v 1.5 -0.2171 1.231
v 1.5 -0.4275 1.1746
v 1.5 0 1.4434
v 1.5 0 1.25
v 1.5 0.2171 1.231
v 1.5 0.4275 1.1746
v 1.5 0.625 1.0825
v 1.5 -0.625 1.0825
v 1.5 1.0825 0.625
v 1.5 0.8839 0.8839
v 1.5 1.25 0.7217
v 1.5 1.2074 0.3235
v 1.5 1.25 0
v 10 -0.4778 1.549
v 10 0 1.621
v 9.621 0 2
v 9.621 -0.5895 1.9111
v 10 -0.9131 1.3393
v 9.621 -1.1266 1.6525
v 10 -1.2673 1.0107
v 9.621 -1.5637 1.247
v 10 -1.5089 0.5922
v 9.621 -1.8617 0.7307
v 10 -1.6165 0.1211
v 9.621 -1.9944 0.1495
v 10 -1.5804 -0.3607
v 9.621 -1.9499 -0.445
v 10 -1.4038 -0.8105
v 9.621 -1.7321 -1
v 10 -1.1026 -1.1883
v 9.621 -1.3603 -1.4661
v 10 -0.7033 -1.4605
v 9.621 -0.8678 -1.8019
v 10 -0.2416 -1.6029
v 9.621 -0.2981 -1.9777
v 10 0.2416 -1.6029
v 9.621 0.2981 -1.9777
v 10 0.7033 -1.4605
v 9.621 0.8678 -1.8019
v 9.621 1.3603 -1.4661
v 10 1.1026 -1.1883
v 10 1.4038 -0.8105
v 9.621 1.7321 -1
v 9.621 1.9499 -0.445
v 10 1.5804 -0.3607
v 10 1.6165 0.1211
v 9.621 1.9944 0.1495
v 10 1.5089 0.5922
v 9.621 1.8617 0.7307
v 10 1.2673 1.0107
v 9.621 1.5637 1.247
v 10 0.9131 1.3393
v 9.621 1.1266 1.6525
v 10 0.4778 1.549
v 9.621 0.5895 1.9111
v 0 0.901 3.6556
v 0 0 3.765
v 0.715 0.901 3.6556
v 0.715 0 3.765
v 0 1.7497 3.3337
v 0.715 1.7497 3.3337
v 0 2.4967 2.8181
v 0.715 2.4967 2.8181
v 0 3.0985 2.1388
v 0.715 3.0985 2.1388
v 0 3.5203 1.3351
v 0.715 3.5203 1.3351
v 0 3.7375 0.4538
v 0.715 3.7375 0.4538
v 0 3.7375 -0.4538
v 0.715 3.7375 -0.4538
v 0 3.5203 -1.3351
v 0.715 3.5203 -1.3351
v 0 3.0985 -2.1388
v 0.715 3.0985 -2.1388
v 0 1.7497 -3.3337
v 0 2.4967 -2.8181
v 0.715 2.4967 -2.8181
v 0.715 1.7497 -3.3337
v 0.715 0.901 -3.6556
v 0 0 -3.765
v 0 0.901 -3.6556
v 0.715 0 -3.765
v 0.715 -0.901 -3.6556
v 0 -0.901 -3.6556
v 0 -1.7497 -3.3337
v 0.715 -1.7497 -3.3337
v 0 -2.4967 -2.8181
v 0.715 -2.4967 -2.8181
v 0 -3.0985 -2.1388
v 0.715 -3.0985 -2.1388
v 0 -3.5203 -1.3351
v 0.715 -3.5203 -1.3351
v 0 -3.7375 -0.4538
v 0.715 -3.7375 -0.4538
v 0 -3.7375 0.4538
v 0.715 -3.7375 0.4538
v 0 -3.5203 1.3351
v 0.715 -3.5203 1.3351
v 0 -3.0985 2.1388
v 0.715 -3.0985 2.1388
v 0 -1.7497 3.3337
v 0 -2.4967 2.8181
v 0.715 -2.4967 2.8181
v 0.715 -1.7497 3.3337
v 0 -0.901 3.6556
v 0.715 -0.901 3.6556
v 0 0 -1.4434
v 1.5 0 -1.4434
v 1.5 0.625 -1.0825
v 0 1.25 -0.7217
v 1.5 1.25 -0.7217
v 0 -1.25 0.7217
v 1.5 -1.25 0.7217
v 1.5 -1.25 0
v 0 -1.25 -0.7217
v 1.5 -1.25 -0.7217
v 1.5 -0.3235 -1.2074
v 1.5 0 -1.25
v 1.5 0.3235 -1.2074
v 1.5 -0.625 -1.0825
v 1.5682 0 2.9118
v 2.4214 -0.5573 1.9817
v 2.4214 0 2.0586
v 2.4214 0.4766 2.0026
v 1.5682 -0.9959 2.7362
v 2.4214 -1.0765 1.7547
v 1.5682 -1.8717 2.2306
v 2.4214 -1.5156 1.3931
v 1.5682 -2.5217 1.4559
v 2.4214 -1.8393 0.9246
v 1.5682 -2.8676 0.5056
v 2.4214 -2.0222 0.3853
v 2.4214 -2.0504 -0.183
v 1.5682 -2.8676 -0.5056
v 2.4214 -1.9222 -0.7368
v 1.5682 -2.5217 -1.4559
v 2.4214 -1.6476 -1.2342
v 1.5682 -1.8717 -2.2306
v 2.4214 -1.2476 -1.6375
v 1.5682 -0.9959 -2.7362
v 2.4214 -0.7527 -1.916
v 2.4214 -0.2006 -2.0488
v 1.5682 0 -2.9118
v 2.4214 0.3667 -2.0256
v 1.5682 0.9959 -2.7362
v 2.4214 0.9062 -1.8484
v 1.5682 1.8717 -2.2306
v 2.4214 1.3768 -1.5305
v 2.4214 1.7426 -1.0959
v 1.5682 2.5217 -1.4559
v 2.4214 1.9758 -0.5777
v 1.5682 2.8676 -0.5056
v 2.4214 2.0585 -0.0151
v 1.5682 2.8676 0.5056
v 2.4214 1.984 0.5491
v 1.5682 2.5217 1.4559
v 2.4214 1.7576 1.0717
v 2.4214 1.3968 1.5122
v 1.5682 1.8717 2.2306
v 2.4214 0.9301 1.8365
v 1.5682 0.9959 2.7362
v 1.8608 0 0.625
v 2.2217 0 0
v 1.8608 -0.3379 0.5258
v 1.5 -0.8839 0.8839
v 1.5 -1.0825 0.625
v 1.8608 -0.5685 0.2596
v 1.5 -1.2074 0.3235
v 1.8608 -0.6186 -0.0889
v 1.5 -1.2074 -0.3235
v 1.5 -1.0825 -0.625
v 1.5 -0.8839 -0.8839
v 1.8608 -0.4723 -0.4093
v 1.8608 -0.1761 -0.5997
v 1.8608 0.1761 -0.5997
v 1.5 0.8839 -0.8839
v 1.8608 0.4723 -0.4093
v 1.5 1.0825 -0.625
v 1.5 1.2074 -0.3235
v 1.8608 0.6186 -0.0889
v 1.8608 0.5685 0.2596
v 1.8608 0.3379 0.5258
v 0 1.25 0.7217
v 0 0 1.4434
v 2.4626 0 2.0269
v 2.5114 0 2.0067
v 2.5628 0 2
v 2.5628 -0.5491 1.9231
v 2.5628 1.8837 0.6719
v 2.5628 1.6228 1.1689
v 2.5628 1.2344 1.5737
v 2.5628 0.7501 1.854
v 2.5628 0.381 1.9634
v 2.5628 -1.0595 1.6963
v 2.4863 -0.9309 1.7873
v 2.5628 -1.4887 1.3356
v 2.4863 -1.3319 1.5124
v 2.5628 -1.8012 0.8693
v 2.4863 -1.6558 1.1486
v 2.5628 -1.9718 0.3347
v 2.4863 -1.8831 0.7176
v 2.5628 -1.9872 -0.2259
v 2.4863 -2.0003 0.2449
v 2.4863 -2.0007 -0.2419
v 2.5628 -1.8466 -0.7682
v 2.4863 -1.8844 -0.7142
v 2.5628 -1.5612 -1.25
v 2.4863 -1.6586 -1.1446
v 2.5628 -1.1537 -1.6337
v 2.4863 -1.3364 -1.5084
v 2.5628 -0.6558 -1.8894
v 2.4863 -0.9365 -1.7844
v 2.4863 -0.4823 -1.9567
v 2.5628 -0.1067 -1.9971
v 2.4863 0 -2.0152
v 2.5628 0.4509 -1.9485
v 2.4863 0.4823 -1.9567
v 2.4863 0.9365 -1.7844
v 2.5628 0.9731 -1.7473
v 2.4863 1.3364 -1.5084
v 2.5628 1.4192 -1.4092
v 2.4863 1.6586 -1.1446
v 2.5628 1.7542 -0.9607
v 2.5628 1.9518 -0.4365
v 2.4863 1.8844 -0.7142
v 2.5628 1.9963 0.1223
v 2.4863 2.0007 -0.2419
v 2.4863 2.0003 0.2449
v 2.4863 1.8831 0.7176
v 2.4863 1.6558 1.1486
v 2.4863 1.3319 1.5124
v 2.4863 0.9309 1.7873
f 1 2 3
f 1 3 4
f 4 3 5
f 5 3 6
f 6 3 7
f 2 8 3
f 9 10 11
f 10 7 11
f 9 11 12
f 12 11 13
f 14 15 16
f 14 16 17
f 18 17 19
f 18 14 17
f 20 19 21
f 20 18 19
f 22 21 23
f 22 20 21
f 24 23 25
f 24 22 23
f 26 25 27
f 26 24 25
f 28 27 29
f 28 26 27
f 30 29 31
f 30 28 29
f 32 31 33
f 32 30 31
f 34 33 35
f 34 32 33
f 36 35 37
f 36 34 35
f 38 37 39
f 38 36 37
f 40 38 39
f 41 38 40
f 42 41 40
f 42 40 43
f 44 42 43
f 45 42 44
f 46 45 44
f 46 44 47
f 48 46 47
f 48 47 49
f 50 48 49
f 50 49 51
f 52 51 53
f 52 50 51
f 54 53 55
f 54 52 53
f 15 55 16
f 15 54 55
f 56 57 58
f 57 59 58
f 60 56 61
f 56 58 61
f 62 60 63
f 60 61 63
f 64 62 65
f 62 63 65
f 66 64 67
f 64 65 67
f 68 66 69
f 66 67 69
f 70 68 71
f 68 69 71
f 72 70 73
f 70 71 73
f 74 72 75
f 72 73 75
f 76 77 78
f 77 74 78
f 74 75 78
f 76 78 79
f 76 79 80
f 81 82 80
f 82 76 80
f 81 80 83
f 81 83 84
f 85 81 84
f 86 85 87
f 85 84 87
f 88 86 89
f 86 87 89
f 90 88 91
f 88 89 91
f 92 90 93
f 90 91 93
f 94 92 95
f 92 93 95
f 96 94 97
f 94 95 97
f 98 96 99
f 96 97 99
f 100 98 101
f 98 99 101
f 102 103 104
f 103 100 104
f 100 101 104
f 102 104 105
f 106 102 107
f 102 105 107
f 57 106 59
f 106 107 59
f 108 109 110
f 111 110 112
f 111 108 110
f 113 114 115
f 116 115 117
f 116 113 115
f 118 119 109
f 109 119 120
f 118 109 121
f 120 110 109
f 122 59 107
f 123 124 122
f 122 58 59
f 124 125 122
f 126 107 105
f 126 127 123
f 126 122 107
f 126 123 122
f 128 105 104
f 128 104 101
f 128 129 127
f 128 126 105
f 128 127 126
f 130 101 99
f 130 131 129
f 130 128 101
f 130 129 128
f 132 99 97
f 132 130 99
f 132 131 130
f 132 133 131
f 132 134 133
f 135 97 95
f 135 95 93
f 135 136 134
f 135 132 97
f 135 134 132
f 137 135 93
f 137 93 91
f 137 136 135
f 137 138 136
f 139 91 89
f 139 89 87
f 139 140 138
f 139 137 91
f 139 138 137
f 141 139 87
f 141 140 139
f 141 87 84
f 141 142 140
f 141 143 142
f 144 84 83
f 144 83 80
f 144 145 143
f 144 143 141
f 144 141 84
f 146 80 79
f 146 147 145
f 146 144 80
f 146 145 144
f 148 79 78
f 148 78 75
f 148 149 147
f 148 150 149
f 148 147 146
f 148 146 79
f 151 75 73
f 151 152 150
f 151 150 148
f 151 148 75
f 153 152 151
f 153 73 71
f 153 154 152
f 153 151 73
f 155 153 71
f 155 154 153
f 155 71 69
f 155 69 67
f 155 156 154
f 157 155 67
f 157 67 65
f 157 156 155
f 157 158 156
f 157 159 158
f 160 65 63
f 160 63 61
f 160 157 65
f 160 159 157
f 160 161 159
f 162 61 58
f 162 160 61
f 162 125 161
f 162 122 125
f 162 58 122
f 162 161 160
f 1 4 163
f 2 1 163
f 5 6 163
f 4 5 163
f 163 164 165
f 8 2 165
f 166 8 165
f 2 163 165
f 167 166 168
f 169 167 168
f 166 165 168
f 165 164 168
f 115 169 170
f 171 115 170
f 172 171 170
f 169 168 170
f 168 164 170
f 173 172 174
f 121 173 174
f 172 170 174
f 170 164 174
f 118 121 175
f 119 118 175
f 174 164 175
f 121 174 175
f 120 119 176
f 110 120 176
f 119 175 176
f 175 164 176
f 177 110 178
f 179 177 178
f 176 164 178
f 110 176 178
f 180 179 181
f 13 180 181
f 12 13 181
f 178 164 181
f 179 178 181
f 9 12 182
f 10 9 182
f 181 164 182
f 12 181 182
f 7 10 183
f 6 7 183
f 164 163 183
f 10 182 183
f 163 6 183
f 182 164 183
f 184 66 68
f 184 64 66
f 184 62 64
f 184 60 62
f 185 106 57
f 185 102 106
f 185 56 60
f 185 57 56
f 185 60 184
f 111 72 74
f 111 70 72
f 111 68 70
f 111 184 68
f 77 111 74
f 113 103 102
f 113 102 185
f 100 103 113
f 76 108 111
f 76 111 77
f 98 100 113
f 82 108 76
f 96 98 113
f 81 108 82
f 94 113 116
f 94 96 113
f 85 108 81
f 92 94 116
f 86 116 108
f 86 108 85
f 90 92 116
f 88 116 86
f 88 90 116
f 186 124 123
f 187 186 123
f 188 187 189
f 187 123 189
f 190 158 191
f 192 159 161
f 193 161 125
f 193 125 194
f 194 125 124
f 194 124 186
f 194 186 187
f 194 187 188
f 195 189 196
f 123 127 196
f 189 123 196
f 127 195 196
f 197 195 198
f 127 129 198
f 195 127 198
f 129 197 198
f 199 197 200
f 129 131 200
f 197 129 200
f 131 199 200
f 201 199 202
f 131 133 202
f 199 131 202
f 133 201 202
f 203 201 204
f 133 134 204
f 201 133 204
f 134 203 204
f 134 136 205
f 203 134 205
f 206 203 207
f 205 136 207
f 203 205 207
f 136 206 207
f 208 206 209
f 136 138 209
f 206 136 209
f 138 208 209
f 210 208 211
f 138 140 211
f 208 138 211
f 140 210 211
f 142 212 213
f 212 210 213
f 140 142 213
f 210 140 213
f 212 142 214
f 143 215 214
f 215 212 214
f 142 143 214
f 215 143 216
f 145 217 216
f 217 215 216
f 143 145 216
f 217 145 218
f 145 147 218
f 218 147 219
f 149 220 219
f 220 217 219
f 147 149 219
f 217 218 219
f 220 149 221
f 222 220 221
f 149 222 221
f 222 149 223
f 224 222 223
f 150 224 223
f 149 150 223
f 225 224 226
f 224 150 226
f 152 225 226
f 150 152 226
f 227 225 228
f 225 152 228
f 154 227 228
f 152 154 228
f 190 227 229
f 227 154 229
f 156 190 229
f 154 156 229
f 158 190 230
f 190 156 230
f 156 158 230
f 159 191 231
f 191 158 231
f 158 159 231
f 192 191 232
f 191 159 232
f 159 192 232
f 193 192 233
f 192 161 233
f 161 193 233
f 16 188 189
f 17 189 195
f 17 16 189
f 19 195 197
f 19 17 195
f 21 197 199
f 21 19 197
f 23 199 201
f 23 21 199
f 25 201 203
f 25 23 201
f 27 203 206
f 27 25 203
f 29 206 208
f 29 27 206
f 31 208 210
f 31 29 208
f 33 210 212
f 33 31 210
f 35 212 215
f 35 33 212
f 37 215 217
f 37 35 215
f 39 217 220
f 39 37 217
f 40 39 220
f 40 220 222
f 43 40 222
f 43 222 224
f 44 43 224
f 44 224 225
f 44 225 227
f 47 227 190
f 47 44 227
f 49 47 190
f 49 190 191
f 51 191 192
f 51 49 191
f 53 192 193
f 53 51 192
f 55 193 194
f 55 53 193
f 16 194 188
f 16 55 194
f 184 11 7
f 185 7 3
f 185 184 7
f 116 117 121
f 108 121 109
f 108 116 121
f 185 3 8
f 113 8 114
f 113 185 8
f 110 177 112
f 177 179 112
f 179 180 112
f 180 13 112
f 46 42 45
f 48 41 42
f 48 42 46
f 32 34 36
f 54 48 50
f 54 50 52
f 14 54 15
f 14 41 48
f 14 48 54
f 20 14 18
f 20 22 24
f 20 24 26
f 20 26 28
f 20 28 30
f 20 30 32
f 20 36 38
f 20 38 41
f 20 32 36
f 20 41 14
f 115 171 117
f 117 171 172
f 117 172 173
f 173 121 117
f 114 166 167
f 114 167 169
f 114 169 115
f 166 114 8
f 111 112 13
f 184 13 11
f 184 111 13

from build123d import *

# Parameters (mm, degrees)
HEXAGONSOCKET_DEPTH = 1.5
HEADFILLET_R        = 0.2
CHAMFER_2_SIZE      = 0.379
SKETCH4_W           = 5
SKETCH4_H           = 5


with BuildPart() as part:
    # Sketch1 → Base (revolve)
    with BuildSketch(Plane.XY, mode=Mode.PRIVATE) as base_sk:
        Polygon((0, 0), (0, 4.48), (2.48, 2), (10, 2), (10, 0), align=None)
    revolve(base_sk.sketch.rotate(Axis((-0.587069181, 0, 0), (1, 0, 0)), 90), axis=Axis((-0.587069181, 0, 0), (1, 0, 0)))

    # Sketch2 → HexagonSocket (cut)
    with BuildSketch(Plane(origin=(0, 0, 0), x_dir=(0, 0, -1), z_dir=(1, 0, 0))):
        Polygon((1.443375673, 0), (0.721687836, 1.25), (-0.721687836, 1.25), (-1.443375673, 0), (-0.721687836, -1.25), (0.721687836, -1.25), align=None)
    extrude(amount=HEXAGONSOCKET_DEPTH, mode=Mode.SUBTRACT)

    # Sketch3 → Cut-Revolve1 (revolve, cut)
    with BuildSketch(Plane.XY, mode=Mode.PRIVATE) as cut_revolve1_sk:
        Polygon((1.5, 1.25), (2.221687836, 0), (1.5, 0), align=None)
    revolve(cut_revolve1_sk.sketch.rotate(Axis((-0.439109555, 0, 0), (1, 0, 0)), 90), axis=Axis((-0.439109555, 0, 0), (1, 0, 0)), mode=Mode.SUBTRACT)

    # HeadFillet
    headfillet_edges = [part.edges().sort_by_distance(p)[0] for p in [
        (2.48, 0, -2),
    ]]
    fillet(headfillet_edges, radius=HEADFILLET_R)

    # Chamfer 2
    chamfer_2_edges = [part.edges().sort_by_distance(p)[0] for p in [
        (10, 0, -2),
    ]]
    chamfer(chamfer_2_edges, length=CHAMFER_2_SIZE)

    # Sketch4 → Cut-Revolve2 (revolve, cut)
    with BuildSketch(Plane(origin=(0, 0, 0), x_dir=(1, 0, 0), z_dir=(0, 1, 0)), mode=Mode.PRIVATE) as cut_revolve2_sk:
        with Locations((0.5, 6.265)):
            Rectangle(SKETCH4_W, SKETCH4_H)
    revolve(cut_revolve2_sk.sketch.rotate(Axis((11.853138686, 0, 0), (-1, 0, 0)), 180), axis=Axis((11.853138686, 0, 0), (-1, 0, 0)), mode=Mode.SUBTRACT)


solid = part.part
